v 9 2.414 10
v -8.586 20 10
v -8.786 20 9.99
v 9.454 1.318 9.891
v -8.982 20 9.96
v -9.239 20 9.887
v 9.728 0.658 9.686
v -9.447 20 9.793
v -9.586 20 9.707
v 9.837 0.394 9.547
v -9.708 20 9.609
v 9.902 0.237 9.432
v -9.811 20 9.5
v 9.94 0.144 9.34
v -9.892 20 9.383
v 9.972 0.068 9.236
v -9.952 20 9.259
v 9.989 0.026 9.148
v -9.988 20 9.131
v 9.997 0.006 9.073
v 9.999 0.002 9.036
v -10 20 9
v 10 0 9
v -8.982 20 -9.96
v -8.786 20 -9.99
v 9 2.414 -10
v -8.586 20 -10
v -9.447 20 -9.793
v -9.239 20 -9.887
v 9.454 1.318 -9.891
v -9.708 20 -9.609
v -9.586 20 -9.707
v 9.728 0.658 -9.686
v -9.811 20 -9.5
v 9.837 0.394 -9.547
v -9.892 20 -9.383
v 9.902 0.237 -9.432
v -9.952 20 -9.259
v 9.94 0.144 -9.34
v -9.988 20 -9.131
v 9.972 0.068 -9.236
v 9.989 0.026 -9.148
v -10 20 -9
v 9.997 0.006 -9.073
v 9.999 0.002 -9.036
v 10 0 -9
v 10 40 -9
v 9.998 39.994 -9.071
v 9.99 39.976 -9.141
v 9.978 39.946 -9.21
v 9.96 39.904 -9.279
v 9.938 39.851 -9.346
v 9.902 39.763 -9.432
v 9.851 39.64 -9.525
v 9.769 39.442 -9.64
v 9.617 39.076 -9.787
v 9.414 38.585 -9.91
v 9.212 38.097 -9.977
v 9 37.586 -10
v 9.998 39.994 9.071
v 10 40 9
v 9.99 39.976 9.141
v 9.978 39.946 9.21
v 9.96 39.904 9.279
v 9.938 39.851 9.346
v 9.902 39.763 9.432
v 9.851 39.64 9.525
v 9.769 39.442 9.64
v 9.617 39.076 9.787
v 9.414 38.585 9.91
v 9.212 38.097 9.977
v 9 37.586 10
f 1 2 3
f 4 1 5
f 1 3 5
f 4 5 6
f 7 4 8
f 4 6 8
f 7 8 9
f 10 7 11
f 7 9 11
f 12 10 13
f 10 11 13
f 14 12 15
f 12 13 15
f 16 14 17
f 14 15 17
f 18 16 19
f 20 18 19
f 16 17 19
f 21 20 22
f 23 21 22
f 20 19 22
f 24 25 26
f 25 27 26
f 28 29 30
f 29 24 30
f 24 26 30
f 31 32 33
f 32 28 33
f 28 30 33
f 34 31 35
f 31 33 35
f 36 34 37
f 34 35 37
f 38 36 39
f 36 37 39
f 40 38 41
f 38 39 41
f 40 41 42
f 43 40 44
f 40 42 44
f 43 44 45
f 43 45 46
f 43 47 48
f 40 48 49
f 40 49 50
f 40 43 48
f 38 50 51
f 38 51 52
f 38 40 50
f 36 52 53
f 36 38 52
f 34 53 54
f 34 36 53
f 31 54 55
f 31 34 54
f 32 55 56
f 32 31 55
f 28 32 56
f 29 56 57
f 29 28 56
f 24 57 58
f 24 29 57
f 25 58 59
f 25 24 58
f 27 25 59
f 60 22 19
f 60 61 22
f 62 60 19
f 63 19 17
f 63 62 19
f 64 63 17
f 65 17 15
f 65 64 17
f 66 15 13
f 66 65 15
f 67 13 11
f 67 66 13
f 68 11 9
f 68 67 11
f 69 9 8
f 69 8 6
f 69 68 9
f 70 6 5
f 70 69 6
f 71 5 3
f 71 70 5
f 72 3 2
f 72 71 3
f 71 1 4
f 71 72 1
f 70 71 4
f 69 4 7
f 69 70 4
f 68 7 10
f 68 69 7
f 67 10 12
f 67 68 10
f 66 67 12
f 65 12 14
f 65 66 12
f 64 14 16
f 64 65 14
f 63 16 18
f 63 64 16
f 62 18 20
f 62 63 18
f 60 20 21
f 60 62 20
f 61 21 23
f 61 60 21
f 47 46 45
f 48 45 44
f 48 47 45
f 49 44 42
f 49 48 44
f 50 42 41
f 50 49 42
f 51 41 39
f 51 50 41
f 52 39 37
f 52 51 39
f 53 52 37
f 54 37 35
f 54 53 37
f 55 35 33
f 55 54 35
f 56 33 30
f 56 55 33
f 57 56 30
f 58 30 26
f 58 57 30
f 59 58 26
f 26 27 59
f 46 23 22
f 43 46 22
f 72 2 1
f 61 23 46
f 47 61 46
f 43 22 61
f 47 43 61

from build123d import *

# Parameters (mm, degrees)
SKETCH1_W           = 20
SKETCH1_H           = 20
BOSS_EXTRUDE1_DEPTH = 40
CUT_EXTRUDE1_DEPTH  = 46.82575695
FILLET1_R           = 1


with BuildPart() as part:
    # Sketch1 → Boss-Extrude1 (new body)
    with BuildSketch(Plane(origin=(0, 0, 0), x_dir=(1, 0, 0), z_dir=(0, 1, 0))):
        Rectangle(SKETCH1_W, SKETCH1_H)
    extrude(amount=BOSS_EXTRUDE1_DEPTH)

    # Sketch2 → Cut-Extrude1 (cut, through all)
    with BuildSketch(Plane.XY.offset(10)):
        Polygon((-10, 20), (10, 40), (-10, 40), align=None)
        Polygon((10, 0), (-10, 20), (-10, 0), align=None)
    extrude(amount=-CUT_EXTRUDE1_DEPTH, mode=Mode.SUBTRACT)

    # Fillet1
    fillet1_edges = [part.edges().sort_by_distance(p)[0] for p in [
        (0, 30, 10),
        (0, 30, -10),
        (0, 10, 10),
        (0, 10, -10),
        (10, 20, 10),
        (10, 20, -10),
    ]]
    fillet(fillet1_edges, radius=FILLET1_R)


solid = part.part
